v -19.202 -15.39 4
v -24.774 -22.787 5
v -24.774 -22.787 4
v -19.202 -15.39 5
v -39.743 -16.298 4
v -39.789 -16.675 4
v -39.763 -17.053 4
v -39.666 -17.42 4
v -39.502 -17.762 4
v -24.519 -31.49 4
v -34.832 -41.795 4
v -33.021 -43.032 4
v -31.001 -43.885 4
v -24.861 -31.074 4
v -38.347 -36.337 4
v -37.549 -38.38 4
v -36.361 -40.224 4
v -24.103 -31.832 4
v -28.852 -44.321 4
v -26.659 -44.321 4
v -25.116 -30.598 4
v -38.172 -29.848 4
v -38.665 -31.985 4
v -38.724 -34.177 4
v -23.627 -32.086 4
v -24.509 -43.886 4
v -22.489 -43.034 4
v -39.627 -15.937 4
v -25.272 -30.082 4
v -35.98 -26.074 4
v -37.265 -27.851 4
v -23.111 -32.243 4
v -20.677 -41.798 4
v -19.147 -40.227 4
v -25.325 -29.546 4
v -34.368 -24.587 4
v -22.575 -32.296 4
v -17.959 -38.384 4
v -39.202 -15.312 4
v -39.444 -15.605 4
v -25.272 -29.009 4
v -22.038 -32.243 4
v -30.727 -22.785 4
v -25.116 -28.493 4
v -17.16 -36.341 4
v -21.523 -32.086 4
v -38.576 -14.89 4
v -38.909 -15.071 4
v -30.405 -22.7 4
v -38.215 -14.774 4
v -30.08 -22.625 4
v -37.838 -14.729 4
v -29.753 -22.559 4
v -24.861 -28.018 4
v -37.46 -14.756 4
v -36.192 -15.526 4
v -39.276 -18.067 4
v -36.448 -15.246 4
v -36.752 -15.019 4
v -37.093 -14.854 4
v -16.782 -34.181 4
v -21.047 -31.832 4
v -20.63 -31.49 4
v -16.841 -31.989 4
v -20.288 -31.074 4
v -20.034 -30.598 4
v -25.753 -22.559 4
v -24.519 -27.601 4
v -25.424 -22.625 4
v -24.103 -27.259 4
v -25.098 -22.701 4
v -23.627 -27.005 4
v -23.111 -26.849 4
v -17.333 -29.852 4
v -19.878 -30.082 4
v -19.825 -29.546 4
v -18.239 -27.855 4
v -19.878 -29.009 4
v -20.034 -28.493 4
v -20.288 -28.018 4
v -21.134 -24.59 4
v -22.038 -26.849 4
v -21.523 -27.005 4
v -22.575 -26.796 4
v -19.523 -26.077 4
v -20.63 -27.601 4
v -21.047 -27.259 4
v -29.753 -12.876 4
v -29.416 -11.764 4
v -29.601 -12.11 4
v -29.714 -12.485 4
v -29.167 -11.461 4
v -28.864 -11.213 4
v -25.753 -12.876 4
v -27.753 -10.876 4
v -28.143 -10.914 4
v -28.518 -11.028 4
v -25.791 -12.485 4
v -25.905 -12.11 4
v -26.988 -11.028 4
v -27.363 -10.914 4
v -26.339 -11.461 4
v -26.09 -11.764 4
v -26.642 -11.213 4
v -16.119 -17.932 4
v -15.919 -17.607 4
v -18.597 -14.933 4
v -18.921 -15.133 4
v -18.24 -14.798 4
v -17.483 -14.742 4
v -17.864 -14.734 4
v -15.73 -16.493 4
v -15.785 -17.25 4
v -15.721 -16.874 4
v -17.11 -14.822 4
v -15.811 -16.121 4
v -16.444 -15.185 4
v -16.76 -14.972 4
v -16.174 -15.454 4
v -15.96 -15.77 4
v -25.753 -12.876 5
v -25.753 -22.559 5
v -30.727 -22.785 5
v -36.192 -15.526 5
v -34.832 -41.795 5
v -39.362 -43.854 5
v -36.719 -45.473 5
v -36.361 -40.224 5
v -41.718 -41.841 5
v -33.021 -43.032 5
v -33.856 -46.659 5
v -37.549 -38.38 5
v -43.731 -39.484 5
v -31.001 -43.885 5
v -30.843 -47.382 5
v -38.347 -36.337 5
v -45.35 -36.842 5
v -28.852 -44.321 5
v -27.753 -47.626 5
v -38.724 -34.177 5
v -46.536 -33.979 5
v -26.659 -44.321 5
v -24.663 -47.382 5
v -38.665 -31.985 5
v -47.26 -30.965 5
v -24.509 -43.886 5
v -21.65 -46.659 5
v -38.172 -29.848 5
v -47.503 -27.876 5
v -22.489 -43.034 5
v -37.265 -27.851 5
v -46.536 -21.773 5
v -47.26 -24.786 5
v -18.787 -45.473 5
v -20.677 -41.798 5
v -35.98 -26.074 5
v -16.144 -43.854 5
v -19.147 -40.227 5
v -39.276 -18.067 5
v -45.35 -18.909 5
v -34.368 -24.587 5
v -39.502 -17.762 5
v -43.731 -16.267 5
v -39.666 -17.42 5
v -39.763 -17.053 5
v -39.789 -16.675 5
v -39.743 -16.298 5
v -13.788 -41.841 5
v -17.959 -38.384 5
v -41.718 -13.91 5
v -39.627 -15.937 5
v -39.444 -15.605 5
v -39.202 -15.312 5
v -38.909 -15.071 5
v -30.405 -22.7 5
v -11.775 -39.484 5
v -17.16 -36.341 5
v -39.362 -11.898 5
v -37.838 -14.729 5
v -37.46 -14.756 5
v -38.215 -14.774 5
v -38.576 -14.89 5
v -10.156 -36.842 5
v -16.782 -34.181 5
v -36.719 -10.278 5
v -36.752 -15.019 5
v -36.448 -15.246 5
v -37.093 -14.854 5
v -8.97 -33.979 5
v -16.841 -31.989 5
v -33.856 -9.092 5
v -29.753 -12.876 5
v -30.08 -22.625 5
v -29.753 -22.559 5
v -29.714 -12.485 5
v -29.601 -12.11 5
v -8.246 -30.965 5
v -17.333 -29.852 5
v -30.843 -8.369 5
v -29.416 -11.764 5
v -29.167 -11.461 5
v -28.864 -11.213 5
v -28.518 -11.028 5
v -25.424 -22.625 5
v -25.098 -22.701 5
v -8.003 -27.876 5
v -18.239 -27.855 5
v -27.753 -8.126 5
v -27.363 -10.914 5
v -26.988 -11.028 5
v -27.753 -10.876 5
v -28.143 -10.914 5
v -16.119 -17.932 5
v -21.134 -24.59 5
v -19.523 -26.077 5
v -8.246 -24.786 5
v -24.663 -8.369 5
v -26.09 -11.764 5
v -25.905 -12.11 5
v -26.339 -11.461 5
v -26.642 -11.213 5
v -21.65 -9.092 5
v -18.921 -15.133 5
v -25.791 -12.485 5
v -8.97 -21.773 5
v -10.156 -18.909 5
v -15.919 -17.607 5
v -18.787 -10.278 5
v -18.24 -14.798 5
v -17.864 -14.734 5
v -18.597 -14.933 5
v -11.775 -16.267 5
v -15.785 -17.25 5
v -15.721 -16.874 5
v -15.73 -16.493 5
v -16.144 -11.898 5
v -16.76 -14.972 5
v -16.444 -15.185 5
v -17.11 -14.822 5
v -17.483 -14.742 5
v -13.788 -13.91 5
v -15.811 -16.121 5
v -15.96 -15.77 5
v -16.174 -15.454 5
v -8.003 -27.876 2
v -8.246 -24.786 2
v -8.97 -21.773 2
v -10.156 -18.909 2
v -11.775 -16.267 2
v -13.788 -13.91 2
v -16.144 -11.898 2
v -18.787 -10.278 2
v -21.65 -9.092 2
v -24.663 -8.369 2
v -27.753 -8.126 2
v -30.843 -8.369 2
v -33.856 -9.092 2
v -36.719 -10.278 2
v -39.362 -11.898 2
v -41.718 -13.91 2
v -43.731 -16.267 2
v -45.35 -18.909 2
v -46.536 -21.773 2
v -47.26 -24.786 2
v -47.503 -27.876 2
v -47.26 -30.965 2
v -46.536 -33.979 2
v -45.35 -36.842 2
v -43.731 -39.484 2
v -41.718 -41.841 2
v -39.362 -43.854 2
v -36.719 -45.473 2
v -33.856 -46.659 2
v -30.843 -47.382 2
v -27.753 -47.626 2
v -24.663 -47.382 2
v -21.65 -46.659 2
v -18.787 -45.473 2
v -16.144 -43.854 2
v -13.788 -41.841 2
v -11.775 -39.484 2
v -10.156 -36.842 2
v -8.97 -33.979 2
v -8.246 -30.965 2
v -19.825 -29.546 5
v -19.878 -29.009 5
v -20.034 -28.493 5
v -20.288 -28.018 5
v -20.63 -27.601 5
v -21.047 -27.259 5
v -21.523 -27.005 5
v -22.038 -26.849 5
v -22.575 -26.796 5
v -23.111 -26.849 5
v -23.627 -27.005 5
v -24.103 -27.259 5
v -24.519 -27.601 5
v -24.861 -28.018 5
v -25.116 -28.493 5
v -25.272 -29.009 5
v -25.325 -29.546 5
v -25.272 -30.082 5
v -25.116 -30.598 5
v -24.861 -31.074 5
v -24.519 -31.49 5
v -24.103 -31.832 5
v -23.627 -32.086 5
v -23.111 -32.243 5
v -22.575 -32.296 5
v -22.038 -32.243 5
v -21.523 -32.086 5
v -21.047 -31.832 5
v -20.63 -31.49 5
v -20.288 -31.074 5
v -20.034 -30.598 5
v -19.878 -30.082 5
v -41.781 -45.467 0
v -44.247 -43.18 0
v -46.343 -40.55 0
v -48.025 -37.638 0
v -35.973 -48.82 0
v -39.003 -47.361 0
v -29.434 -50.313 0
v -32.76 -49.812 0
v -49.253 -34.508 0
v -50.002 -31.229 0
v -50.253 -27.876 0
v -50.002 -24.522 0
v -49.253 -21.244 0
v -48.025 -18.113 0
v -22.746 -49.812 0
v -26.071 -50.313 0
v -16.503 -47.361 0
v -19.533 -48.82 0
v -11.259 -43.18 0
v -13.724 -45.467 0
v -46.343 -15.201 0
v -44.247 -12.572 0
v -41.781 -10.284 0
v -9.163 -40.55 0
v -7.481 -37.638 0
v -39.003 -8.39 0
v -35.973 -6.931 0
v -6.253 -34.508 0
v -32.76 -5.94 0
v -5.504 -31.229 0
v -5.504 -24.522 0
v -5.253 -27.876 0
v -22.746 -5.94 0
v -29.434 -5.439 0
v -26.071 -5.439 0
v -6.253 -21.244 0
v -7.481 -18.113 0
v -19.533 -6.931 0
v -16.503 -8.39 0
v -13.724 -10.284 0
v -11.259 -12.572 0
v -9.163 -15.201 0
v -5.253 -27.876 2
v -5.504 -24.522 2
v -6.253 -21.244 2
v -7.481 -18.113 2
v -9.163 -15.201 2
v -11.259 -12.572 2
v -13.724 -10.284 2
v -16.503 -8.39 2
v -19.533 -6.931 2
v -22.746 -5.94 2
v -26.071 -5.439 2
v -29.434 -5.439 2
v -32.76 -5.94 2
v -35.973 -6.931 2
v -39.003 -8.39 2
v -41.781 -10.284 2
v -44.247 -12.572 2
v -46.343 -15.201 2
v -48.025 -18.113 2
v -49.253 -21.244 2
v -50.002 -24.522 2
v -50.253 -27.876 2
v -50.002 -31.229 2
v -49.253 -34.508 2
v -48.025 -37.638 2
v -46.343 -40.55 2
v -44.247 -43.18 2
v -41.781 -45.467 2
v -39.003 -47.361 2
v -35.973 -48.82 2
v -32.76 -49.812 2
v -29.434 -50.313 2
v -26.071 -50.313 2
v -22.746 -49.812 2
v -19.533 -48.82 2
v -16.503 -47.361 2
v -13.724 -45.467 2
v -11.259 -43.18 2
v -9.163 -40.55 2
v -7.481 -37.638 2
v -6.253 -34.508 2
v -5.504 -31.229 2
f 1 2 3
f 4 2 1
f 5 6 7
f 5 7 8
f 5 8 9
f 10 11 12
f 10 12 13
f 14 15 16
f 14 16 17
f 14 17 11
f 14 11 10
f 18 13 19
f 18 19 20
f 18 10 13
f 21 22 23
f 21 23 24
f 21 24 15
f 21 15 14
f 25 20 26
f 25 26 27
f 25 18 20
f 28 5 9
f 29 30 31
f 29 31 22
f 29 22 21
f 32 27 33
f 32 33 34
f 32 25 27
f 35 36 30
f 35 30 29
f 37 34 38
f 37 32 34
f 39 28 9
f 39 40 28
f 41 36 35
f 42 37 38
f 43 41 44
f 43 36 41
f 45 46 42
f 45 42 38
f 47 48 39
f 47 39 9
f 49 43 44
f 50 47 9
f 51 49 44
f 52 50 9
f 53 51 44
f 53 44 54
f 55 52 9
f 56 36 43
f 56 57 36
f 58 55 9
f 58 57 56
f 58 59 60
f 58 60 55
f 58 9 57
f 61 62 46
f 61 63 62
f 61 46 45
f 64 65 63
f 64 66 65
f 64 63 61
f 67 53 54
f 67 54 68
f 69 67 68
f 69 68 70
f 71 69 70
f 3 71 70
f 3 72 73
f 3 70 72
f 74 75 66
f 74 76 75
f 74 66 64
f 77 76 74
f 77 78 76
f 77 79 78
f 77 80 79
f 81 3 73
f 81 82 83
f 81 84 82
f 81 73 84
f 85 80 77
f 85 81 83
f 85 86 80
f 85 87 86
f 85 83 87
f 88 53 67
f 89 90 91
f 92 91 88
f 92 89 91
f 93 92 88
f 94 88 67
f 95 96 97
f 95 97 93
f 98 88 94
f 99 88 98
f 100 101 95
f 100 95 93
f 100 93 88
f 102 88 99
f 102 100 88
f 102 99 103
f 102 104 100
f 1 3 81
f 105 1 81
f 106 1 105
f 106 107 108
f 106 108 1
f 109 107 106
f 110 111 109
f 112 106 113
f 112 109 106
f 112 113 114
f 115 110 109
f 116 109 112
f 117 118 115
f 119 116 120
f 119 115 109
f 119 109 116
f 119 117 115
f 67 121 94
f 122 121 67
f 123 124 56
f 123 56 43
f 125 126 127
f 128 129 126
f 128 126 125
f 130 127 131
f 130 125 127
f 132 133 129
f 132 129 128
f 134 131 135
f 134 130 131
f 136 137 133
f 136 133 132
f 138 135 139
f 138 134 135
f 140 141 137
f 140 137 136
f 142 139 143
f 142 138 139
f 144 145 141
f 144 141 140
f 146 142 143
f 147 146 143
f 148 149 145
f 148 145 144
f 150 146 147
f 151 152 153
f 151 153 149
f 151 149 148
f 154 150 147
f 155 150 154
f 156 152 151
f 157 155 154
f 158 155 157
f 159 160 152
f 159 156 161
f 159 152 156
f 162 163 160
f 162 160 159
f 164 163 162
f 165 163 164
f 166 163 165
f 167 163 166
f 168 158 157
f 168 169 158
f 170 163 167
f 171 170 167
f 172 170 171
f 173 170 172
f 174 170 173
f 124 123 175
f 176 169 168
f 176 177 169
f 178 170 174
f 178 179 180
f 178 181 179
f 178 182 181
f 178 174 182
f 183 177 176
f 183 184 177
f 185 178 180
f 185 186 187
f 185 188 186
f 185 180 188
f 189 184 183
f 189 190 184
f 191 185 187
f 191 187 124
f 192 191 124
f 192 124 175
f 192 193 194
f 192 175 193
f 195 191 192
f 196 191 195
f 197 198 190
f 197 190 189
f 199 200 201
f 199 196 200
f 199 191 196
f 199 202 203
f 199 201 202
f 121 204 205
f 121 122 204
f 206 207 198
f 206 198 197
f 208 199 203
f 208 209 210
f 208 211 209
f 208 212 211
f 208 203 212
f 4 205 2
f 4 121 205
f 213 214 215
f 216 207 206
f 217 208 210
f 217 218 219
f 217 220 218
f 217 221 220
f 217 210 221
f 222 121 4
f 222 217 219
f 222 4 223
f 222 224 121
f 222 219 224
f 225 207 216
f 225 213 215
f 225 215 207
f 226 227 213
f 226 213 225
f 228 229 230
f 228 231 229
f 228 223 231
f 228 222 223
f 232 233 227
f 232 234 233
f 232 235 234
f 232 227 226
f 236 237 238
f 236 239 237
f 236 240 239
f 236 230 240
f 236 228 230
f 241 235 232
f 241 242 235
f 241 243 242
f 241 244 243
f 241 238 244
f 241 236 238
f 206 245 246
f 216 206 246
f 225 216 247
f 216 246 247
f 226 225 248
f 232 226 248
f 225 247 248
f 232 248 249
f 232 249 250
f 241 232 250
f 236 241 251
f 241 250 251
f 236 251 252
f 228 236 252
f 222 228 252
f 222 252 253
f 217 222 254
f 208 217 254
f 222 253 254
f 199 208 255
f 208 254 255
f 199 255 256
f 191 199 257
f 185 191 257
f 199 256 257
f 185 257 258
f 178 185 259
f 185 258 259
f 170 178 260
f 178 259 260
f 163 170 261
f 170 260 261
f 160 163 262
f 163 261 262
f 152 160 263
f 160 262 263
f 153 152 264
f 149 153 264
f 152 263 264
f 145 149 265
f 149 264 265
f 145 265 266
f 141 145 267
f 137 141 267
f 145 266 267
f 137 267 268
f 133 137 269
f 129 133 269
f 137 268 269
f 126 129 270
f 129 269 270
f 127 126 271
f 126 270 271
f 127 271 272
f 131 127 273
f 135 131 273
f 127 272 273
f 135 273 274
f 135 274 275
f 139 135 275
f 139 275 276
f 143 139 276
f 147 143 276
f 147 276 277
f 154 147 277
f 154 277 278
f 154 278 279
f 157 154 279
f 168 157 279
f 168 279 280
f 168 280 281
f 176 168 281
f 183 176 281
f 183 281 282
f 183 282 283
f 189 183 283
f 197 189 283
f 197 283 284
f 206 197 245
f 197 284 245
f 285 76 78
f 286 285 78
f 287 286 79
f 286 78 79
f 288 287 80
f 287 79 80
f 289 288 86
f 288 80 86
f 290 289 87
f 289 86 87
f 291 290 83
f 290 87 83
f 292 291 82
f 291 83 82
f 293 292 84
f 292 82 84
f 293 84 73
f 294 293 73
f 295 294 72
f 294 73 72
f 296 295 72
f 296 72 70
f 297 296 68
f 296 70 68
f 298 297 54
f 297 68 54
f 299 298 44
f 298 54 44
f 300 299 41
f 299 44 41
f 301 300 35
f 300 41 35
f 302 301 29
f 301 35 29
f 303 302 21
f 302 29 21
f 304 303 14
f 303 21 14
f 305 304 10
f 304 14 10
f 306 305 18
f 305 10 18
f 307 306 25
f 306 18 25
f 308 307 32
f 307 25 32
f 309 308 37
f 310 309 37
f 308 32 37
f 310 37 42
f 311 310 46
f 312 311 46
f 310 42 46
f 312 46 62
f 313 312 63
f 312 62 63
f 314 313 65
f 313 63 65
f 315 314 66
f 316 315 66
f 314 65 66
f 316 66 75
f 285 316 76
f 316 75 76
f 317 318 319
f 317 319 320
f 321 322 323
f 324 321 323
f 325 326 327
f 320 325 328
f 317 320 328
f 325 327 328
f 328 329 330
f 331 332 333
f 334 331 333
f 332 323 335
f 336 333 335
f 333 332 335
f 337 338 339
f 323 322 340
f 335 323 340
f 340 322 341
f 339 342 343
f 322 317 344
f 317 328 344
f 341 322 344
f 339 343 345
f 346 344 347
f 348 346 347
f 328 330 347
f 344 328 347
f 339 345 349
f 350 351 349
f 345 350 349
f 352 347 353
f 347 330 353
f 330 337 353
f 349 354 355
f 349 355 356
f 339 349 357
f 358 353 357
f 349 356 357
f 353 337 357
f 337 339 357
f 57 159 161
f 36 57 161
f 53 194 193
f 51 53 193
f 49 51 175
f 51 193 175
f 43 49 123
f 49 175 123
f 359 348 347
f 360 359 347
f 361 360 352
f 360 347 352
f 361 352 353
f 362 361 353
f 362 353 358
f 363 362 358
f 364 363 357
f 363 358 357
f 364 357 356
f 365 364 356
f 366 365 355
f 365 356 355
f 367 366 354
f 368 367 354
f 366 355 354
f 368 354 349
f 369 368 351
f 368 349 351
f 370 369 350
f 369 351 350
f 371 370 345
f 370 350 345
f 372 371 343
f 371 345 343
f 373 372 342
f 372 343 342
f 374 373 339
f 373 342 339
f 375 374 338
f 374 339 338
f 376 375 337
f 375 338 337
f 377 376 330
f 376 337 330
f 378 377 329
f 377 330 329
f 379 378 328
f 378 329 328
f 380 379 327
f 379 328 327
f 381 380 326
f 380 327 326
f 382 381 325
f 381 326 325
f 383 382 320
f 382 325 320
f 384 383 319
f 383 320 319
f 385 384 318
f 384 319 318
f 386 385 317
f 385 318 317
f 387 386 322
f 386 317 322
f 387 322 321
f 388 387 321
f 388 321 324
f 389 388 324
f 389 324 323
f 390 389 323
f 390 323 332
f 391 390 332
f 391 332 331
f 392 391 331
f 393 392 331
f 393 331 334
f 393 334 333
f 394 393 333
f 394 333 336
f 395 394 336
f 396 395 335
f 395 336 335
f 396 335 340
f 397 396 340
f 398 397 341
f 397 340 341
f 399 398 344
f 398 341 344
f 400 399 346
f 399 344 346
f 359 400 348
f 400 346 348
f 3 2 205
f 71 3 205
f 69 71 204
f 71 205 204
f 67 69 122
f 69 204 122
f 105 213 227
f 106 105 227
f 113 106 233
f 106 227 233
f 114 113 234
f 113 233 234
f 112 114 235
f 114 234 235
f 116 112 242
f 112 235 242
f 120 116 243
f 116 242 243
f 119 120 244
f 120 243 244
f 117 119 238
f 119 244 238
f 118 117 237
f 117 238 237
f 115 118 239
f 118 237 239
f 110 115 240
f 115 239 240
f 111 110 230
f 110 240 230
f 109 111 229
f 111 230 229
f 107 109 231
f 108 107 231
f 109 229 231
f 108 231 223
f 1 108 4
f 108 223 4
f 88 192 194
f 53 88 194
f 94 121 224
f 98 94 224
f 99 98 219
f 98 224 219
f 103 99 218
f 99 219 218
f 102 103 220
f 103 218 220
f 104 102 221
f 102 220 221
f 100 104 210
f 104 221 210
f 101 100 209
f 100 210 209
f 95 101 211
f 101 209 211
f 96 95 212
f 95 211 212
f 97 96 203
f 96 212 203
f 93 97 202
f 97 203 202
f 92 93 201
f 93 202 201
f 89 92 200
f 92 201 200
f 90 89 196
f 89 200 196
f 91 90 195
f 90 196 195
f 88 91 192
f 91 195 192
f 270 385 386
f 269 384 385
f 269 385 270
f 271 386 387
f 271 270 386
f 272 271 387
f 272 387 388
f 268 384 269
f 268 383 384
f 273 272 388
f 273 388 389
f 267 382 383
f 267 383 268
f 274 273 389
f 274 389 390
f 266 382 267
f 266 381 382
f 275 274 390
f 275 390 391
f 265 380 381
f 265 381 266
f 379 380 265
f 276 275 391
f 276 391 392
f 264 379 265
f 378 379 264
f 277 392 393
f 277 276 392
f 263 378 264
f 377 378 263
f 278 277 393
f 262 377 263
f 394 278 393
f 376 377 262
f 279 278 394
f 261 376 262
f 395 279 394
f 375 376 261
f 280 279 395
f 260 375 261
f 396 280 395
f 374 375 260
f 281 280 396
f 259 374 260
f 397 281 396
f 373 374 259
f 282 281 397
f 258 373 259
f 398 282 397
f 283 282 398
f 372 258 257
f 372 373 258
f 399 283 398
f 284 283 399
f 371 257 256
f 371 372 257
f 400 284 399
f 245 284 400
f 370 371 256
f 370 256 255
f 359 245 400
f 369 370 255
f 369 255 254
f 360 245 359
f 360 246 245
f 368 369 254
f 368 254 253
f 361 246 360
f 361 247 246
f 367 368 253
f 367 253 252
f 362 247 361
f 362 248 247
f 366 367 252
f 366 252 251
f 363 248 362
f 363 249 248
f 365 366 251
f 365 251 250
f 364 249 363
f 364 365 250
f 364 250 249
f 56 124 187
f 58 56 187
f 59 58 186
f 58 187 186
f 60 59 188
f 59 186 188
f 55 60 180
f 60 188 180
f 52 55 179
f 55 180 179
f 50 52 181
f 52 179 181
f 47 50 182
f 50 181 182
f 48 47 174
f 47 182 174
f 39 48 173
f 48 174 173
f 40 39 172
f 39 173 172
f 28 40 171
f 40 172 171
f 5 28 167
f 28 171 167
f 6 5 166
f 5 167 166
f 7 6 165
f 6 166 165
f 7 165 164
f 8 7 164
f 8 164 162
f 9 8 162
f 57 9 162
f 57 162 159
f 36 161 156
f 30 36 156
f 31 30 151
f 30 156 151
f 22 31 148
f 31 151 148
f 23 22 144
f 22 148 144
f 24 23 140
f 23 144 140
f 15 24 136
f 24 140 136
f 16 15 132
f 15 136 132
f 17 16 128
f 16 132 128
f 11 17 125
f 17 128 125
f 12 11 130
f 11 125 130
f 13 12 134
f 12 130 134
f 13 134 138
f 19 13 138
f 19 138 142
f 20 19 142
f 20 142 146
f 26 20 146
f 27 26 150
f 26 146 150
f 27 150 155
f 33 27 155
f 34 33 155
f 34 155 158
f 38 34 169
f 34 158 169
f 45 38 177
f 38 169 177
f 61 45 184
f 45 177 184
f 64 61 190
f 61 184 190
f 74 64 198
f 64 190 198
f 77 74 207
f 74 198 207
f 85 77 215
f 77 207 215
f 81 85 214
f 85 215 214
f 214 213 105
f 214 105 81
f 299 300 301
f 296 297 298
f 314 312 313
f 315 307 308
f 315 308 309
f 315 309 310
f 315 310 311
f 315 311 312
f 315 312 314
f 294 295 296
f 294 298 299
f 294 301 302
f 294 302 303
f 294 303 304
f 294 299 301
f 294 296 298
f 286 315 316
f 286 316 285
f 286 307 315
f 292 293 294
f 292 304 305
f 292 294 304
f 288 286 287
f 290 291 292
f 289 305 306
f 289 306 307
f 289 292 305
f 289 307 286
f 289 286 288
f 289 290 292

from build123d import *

# Parameters (mm, degrees)
SKETCH027_R     = 22.5
PAD008_DEPTH    = 2
SKETCH028_R     = 19.75
PAD009_DEPTH    = 3
POCKET014_DEPTH = 1
SKETCH030_R     = 2.75
PAD010_DEPTH    = 1


with BuildPart() as part:
    # Sketch027 → Pad008 (new body)
    with BuildSketch(Plane.XY):
        with Locations((-27.752922, -27.875624)):
            Circle(SKETCH027_R)
    extrude(amount=PAD008_DEPTH)

    # Sketch028 (on Face3 of Pad008) → Pad009 (join)
    with BuildSketch(Plane.XY.offset(2)):
        with Locations((-27.752922, -27.875624)):
            Circle(SKETCH028_R)
    extrude(amount=PAD009_DEPTH)

    # Sketch029 (on Face5 of Pad009) → Pocket014 (cut)
    with BuildSketch(Plane.XY.offset(5)):
        with BuildLine():
            ThreePointArc((-34.368184, -24.587091), (-27.755113, -44.375624), (-21.134159, -24.589727))
            Line((-16.118527, -17.931863), (-21.134159, -24.589727))
            ThreePointArc((-16.118527, -17.931863), (-16.443912, -15.185115), (-19.202253, -15.39019))
            Line((-24.774256, -22.786594), (-19.202253, -15.39019))
            ThreePointArc((-24.774256, -22.786594), (-25.260988, -22.661602), (-25.752922, -22.55897))
            Line((-25.752922, -12.875624), (-25.752922, -22.55897))
            ThreePointArc((-25.752922, -12.875624), (-27.752922, -10.875624), (-29.752922, -12.875624))
            Line((-29.752922, -12.875624), (-29.752922, -22.55897))
            ThreePointArc((-29.752922, -22.55897), (-30.242757, -22.661114), (-30.727441, -22.785429))
            Line((-36.191966, -15.525677), (-30.727441, -22.785429))
            ThreePointArc((-36.191966, -15.525677), (-39.061624, -15.184862), (-39.276171, -18.066713))
            Line((-39.276171, -18.066713), (-34.368184, -24.587091))
        make_face()
    extrude(amount=-POCKET014_DEPTH, mode=Mode.SUBTRACT)

    # Sketch030 (on Face18 of Pocket014) → Pad010 (join)
    with BuildSketch(Plane.XY.offset(4)):
        with Locations((-22.574881, -29.54578)):
            Circle(SKETCH030_R)
    extrude(amount=PAD010_DEPTH)


solid = part.part
